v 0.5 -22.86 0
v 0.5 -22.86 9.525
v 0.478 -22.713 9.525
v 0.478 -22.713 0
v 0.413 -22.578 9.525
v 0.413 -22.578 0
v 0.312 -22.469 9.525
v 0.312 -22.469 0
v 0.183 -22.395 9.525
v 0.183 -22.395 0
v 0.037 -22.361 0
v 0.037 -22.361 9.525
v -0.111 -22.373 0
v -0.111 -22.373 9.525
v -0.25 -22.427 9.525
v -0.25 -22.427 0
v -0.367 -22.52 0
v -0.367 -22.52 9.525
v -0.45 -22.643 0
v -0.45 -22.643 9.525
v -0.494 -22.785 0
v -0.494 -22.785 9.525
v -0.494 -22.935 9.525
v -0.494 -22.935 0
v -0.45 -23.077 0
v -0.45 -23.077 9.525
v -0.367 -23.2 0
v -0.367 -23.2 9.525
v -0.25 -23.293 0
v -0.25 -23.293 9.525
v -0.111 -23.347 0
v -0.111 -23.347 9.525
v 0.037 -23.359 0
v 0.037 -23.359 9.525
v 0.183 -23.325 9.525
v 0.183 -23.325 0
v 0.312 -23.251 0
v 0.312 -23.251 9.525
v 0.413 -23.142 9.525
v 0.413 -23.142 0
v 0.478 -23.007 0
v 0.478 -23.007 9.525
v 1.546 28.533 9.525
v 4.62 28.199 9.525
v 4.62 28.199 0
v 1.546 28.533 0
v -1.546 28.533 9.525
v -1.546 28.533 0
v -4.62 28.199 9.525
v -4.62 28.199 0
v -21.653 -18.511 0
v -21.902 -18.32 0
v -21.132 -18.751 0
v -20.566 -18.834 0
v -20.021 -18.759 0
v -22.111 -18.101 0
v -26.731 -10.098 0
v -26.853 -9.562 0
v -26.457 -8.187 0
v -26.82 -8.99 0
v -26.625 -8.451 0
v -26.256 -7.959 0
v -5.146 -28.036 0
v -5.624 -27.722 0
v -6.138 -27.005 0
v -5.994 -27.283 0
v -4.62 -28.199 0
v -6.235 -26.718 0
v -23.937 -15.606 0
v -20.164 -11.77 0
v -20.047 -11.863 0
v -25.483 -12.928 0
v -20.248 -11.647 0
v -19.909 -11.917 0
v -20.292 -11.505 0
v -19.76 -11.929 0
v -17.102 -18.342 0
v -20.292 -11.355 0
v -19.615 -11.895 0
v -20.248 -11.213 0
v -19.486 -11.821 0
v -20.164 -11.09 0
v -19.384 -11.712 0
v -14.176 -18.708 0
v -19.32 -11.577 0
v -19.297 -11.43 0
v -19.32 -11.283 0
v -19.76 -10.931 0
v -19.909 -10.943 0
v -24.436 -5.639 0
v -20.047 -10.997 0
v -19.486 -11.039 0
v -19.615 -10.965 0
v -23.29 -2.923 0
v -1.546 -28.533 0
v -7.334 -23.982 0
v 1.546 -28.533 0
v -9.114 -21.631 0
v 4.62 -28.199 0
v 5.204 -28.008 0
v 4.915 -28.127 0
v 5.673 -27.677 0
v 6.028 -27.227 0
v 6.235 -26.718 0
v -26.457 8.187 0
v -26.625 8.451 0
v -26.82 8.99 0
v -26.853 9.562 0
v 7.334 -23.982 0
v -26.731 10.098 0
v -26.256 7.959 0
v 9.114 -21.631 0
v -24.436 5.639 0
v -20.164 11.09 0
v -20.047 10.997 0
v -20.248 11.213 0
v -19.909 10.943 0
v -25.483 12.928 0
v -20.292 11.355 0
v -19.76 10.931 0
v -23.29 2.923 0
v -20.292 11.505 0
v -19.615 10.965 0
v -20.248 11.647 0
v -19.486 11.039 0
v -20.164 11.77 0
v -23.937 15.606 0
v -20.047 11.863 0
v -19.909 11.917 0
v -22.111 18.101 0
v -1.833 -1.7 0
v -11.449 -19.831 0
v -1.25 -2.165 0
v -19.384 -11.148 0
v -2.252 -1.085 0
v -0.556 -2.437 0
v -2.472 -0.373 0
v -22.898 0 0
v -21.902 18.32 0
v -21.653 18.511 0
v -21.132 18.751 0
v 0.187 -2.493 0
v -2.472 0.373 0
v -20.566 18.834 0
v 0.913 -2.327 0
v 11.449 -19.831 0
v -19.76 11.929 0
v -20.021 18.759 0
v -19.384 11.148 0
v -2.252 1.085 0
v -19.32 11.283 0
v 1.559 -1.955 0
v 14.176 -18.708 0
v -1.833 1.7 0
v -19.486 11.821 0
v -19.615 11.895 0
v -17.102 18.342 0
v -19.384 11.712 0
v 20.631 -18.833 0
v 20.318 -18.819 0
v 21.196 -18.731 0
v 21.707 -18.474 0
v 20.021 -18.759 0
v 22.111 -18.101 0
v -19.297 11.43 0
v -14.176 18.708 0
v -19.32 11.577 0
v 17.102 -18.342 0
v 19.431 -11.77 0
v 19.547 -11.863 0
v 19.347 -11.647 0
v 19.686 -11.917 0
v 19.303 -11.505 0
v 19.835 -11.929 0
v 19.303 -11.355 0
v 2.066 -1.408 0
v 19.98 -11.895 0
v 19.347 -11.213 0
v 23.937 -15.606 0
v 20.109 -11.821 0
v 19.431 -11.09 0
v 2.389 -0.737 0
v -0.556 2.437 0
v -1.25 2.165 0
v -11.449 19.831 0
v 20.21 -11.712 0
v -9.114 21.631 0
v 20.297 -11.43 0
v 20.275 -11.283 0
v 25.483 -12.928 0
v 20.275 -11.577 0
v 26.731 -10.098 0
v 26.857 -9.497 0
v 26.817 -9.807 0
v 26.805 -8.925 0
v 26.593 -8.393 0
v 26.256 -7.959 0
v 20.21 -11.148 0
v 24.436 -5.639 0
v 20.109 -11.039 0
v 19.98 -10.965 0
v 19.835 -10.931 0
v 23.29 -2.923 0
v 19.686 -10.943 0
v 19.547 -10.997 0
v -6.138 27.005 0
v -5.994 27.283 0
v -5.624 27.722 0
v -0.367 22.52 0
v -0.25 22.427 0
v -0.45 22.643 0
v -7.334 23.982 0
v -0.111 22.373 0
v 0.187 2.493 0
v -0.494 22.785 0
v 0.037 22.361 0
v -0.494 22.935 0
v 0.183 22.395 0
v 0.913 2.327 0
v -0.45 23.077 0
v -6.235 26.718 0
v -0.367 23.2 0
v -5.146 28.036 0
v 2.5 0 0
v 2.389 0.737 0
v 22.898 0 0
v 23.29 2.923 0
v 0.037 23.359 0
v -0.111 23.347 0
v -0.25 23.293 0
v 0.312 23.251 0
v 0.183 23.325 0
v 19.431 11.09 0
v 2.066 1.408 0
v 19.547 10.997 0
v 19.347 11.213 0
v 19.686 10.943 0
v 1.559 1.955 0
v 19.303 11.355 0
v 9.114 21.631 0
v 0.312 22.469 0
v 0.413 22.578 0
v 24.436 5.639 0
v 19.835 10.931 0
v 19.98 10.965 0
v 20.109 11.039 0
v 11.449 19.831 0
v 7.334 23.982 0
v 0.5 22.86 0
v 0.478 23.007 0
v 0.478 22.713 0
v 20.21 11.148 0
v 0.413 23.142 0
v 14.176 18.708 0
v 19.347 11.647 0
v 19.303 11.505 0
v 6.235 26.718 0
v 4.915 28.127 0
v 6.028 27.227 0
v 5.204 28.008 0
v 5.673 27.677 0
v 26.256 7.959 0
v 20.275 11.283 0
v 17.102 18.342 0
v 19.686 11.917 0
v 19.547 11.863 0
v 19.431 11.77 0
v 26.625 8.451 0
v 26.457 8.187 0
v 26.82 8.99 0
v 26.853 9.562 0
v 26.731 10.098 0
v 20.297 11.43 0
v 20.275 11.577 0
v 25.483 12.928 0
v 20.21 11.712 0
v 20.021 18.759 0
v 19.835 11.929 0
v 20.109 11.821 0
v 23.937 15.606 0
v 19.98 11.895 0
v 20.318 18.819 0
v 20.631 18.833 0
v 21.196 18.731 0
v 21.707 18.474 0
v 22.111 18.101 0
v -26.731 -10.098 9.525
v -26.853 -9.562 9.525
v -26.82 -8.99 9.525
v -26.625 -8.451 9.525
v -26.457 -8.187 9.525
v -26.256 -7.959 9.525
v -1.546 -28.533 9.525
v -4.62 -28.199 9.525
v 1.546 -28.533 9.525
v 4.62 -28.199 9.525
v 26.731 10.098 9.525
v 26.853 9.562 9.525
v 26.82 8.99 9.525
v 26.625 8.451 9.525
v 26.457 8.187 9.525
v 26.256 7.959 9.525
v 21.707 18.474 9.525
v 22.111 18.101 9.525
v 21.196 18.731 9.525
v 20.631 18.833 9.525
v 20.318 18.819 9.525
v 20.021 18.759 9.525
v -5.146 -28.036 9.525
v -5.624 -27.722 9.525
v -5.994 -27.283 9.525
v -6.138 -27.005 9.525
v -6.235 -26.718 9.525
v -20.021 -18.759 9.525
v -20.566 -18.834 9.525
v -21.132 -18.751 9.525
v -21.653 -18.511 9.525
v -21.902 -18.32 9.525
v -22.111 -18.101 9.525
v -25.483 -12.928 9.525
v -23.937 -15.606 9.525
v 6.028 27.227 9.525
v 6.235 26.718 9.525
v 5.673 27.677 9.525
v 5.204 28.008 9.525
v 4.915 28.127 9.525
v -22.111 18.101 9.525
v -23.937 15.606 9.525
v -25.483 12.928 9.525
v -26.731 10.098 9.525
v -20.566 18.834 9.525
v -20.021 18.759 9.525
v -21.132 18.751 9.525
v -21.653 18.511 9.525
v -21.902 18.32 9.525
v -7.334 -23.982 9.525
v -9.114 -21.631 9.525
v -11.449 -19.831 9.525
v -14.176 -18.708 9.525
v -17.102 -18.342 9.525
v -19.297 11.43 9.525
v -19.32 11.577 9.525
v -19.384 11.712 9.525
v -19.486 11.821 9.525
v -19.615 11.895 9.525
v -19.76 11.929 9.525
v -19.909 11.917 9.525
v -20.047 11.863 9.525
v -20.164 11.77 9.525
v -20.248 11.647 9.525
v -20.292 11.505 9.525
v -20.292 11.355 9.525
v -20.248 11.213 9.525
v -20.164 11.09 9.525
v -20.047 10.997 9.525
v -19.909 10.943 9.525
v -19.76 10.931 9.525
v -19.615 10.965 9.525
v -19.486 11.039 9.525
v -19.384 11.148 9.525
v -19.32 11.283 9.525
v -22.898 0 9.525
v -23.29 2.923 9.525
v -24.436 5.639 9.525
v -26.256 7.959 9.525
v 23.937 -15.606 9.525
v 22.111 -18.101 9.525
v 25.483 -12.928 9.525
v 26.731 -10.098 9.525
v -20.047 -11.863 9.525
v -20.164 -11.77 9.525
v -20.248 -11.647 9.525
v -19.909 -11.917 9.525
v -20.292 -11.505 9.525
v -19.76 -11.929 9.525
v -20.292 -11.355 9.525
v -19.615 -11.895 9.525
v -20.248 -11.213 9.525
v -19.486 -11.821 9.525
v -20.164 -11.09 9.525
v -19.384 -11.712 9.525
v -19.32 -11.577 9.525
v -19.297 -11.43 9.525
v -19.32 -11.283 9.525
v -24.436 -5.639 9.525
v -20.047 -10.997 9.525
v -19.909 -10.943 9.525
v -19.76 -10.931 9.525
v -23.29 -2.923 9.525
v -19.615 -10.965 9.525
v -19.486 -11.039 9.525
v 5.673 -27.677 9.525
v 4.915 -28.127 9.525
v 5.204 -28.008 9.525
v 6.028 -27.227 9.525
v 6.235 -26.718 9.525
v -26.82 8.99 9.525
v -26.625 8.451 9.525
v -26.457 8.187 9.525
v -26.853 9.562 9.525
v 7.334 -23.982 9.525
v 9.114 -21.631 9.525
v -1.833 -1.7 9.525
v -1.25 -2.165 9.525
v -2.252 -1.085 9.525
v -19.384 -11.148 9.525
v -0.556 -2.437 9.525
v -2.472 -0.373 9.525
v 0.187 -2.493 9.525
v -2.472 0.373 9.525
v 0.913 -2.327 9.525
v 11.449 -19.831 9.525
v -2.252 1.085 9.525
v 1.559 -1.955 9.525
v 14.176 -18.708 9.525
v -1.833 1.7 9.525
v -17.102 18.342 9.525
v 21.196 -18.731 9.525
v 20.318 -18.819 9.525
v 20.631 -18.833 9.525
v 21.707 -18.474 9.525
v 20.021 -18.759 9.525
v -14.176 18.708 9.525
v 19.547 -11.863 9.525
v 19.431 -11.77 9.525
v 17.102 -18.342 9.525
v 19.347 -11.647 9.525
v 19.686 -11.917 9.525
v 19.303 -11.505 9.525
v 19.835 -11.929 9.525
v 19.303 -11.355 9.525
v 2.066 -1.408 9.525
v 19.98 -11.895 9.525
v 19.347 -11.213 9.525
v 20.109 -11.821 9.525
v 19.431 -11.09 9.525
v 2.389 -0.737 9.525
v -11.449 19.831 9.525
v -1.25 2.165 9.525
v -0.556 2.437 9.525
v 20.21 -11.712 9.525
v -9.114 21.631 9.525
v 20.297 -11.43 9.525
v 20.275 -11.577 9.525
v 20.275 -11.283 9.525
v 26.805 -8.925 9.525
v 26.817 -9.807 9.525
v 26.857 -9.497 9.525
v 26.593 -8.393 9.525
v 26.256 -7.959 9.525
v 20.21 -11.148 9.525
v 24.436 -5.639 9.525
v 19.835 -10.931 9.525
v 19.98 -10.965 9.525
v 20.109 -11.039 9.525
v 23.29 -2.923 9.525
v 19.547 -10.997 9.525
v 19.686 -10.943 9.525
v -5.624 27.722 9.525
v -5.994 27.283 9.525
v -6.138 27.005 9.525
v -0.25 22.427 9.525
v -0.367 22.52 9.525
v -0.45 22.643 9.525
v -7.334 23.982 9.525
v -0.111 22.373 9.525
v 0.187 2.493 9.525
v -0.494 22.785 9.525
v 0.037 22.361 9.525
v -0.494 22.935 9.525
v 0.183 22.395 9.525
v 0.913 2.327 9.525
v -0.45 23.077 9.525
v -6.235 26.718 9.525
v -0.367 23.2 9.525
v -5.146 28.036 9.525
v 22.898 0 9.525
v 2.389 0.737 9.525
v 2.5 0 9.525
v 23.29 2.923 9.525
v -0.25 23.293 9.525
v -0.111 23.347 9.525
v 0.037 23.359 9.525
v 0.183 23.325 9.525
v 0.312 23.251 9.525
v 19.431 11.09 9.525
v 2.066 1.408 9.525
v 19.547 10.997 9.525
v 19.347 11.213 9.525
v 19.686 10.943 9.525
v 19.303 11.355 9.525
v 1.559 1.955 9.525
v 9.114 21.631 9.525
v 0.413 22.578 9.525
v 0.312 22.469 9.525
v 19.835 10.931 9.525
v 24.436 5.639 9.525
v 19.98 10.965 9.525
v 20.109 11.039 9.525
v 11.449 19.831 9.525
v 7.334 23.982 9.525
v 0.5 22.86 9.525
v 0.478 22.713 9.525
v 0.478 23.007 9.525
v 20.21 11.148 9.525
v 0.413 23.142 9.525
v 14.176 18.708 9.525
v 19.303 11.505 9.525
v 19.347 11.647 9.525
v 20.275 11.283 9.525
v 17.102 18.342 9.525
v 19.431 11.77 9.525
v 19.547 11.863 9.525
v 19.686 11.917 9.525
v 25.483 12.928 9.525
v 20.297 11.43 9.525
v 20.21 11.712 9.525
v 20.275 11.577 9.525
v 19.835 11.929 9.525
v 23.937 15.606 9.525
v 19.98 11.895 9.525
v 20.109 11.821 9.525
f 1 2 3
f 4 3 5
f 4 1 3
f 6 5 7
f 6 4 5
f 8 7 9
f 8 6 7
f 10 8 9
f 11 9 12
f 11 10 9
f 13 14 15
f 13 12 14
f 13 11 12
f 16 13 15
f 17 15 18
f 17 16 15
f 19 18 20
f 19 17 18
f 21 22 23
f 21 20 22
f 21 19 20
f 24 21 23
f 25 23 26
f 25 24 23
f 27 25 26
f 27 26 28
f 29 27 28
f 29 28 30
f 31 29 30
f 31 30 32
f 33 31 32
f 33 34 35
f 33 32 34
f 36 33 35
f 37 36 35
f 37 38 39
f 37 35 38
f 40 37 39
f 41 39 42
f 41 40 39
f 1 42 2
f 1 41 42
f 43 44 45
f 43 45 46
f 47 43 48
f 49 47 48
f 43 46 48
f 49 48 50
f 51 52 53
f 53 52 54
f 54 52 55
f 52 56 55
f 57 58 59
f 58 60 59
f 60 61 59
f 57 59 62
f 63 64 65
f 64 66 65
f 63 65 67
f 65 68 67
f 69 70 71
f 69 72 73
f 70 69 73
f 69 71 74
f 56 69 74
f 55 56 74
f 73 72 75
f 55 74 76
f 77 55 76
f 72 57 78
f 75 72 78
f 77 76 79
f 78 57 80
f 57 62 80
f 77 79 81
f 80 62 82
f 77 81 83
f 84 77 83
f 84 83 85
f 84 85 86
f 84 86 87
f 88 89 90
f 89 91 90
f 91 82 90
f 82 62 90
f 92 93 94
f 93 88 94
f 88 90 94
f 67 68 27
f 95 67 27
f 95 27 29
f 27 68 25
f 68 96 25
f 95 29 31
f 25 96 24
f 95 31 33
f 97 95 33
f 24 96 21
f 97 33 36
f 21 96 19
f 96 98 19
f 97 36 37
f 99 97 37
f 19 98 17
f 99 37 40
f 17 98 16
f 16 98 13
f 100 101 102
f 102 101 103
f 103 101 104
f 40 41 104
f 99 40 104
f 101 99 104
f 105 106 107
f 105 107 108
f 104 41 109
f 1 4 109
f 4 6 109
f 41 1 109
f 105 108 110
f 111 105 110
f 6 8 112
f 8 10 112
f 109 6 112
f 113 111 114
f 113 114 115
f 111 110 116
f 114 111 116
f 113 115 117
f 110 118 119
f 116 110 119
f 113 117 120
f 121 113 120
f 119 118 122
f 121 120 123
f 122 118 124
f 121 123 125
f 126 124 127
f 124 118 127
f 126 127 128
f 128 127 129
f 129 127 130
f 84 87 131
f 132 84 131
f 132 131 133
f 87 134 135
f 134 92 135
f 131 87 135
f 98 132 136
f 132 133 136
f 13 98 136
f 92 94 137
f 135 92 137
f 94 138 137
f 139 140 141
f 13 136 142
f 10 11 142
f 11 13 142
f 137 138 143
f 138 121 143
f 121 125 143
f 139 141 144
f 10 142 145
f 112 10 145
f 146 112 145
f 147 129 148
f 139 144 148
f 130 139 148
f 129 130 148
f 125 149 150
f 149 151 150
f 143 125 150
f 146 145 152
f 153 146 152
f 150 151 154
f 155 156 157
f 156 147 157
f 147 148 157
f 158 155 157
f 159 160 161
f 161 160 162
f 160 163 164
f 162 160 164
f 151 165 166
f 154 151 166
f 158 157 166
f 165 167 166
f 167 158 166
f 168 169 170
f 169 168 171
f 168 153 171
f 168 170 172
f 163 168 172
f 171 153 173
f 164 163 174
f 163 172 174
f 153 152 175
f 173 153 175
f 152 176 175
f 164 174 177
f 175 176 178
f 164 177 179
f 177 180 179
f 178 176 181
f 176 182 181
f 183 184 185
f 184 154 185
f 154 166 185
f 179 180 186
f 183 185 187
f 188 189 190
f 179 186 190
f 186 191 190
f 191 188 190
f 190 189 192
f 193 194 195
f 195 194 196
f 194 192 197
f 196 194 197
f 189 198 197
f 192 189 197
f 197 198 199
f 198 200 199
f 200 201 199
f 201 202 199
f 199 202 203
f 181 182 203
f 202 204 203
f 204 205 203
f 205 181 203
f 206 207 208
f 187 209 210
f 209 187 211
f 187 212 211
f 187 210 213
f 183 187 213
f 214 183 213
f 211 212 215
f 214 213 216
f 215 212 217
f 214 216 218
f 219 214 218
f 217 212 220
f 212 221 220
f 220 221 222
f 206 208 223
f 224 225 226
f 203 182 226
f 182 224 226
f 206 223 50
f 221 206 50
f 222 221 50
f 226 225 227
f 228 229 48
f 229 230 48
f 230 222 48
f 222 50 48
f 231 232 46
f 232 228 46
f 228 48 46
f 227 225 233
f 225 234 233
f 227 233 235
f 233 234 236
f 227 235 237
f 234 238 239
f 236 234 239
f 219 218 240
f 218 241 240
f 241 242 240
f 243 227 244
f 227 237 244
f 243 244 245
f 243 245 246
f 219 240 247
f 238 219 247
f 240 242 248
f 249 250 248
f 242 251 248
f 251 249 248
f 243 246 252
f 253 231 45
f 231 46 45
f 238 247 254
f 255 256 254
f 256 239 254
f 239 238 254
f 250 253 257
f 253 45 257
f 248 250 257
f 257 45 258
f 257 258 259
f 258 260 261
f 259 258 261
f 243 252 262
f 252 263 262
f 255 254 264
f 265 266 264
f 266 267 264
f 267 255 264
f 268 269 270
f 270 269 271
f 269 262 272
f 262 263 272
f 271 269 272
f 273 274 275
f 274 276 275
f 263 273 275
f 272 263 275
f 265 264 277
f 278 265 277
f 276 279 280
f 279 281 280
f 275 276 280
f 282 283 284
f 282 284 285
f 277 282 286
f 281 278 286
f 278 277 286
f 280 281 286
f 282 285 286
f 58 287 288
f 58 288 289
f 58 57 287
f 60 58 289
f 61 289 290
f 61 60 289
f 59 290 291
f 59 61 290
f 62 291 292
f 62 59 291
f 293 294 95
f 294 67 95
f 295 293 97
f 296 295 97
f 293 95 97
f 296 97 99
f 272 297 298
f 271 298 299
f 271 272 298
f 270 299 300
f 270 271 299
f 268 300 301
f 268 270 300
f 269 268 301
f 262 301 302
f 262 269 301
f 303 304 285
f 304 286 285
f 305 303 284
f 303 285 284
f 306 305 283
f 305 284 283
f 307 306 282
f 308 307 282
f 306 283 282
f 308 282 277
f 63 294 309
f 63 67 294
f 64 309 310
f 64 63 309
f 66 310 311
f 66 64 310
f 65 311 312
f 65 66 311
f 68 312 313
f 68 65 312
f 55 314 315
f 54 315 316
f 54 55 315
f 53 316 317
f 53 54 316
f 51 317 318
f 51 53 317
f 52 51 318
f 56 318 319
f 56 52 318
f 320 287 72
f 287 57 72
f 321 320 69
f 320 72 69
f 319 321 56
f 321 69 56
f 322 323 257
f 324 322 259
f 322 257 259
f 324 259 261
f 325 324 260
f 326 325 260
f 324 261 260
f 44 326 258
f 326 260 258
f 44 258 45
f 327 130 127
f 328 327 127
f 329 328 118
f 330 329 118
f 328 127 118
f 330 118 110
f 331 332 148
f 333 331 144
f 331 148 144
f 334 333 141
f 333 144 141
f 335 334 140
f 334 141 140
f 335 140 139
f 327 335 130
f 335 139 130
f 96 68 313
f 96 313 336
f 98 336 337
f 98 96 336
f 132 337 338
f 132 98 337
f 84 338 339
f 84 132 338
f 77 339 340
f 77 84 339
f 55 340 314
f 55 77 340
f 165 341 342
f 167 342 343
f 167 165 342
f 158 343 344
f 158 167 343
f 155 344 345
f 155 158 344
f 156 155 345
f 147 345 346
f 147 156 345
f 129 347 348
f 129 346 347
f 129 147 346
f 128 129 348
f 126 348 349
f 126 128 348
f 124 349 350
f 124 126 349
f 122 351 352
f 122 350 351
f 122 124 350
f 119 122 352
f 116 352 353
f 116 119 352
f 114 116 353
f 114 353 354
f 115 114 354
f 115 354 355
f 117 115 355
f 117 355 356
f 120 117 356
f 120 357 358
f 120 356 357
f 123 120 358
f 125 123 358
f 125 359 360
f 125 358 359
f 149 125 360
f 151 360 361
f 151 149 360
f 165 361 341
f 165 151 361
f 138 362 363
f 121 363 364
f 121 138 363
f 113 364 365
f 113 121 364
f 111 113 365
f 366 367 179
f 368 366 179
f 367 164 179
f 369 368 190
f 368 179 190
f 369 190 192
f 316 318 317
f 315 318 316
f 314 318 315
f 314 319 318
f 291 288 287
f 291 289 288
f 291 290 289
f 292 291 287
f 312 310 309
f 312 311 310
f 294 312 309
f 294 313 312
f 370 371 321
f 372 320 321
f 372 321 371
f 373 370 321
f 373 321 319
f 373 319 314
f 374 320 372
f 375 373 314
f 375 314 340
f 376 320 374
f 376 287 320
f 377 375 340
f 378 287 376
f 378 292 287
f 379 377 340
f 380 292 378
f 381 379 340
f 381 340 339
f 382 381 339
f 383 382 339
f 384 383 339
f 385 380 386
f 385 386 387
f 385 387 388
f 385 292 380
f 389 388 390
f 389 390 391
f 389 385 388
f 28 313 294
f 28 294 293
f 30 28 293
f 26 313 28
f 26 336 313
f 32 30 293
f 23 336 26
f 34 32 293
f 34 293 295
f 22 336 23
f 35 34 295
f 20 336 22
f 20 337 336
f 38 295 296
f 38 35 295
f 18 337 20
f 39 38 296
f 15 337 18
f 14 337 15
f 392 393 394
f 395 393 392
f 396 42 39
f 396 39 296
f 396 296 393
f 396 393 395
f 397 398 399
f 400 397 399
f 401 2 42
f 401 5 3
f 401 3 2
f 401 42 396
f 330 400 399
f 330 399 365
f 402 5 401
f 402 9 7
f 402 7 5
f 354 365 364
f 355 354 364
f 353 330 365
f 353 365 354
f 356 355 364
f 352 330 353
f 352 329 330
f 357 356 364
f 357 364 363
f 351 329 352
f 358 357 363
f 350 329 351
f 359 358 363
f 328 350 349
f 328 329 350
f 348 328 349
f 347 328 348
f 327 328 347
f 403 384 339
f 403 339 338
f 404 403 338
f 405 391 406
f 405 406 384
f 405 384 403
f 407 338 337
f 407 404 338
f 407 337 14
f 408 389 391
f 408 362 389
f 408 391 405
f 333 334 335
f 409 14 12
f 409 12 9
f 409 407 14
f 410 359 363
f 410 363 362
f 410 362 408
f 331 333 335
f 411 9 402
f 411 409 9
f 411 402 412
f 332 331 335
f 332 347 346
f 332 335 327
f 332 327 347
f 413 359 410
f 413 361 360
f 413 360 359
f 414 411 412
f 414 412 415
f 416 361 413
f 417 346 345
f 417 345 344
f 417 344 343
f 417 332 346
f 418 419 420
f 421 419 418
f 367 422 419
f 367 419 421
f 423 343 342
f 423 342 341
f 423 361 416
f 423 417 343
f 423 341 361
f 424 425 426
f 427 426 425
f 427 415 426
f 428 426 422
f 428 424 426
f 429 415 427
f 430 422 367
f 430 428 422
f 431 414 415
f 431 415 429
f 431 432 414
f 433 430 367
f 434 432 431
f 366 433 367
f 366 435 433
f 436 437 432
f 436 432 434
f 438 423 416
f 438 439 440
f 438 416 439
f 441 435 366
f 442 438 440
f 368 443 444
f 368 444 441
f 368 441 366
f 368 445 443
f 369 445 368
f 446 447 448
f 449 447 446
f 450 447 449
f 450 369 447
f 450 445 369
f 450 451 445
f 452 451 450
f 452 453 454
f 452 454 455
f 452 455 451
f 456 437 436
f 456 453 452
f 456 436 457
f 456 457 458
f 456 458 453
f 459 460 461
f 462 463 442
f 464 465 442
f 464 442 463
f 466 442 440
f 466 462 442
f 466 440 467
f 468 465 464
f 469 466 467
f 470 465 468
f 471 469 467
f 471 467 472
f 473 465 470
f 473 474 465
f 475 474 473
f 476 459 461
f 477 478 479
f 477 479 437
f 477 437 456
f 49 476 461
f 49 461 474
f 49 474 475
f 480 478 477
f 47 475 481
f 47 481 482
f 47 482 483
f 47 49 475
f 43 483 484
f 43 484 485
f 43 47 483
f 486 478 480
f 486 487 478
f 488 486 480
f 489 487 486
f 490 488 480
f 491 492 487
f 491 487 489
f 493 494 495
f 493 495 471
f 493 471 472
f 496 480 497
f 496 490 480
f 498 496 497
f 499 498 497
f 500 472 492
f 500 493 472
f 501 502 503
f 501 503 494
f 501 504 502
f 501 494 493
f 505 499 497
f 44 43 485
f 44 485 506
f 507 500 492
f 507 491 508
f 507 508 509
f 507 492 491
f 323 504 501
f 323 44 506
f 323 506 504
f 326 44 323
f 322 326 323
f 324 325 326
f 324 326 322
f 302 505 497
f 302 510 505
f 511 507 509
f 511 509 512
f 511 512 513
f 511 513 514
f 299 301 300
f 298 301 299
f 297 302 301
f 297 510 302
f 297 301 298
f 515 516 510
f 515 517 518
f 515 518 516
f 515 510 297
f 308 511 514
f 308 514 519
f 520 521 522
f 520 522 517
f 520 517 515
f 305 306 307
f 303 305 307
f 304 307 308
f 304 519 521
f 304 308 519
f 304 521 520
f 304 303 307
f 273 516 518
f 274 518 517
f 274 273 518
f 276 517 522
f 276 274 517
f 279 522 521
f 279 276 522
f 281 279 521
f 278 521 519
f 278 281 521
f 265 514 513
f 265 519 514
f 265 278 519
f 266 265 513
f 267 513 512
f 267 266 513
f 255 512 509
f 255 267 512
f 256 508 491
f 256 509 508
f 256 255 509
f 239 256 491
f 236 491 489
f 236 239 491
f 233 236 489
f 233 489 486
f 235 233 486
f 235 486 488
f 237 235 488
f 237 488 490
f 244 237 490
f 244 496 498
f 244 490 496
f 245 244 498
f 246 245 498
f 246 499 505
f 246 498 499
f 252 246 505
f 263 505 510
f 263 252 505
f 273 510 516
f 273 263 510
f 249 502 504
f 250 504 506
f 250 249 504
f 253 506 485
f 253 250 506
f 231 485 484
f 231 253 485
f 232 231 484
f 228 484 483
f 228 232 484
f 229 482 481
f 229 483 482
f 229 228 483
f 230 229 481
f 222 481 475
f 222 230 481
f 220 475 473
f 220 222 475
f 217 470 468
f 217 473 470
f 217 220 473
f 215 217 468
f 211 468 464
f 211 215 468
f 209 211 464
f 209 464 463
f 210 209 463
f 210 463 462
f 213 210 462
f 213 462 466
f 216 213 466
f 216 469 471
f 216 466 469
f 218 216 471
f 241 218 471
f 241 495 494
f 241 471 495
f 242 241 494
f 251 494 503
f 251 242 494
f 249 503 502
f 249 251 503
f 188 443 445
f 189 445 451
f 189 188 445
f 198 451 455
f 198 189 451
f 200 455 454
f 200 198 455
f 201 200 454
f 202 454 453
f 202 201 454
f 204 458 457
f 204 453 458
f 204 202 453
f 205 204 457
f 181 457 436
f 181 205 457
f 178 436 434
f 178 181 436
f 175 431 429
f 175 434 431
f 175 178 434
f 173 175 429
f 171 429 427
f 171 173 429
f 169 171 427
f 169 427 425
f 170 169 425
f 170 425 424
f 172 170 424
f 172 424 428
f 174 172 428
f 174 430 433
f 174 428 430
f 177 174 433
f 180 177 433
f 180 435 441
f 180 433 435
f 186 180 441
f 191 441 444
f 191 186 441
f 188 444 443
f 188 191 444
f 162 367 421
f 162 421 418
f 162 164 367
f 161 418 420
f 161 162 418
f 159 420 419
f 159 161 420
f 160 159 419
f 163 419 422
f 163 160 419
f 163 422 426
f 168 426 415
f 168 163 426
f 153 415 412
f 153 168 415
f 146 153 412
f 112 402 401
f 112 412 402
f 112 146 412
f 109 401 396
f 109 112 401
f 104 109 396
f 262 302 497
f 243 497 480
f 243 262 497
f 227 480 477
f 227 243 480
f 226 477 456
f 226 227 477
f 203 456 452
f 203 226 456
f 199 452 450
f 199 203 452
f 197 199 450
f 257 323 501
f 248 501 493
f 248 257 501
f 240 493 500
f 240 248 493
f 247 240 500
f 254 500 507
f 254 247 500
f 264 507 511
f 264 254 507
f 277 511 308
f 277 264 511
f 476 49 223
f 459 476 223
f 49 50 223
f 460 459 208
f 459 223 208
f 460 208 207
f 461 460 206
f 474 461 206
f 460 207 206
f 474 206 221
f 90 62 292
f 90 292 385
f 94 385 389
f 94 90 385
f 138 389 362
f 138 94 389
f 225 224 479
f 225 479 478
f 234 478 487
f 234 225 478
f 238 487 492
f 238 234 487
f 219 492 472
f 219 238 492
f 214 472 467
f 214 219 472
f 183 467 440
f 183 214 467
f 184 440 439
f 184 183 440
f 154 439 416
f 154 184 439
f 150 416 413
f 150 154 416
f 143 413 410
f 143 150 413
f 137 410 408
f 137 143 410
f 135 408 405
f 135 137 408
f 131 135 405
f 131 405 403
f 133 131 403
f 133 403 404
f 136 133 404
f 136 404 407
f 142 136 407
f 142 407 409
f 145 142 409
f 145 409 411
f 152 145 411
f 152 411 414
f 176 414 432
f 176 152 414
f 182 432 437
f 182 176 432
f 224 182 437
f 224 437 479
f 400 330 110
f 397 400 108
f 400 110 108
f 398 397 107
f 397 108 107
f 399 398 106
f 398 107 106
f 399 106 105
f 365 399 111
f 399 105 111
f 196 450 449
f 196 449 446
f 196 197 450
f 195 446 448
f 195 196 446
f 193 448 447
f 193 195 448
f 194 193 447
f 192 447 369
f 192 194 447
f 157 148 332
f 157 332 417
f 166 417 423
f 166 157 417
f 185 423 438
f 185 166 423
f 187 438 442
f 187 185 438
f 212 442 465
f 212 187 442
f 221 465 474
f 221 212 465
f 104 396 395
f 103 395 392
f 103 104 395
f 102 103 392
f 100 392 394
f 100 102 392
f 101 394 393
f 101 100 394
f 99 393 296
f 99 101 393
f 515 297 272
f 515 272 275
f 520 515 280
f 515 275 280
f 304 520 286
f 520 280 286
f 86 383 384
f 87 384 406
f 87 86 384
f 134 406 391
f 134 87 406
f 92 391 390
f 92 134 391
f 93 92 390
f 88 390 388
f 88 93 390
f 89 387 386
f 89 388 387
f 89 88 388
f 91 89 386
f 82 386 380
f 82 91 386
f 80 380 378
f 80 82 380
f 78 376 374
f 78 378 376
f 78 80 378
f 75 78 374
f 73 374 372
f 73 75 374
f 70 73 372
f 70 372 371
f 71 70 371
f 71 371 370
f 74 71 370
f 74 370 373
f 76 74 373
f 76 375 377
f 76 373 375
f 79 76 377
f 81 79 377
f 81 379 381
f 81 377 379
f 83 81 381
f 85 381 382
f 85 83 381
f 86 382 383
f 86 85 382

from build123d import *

# Parameters (mm, degrees)
F0_R     = 28.575
F0_R_2   = 2.5
F1_DEPTH = 9.525
F3_DEPTH = 25.4
F4_R     = 0.5
F5_DEPTH = 25.4
F6_R     = 2


with BuildPart() as f1:
    # F0 (on Top) → F1 (new body)
    with BuildSketch(Plane.XY):
        Circle(F0_R)
        Circle(F0_R_2, mode=Mode.SUBTRACT)
    extrude(amount=F1_DEPTH)

    # F2 (on Top) → F3 (cut)
    with BuildSketch(Plane.XY):
        with BuildLine():
            ThreePointArc((6.6033751745, -33.3637991738), (17.0054966041, -29.4543841262), (25.592210064, -22.4005902387))
            ThreePointArc((25.592210064, -22.4005902387), (11.4492466041, -19.8306768266), (6.6033751745, -33.3637991738))
        make_face()
        with BuildLine():
            ThreePointArc((-25.592210064, -22.4005902387), (-17.0054966041, -29.4543841262), (-6.6033751745, -33.3637991738))
            ThreePointArc((-6.6033751745, -33.3637991738), (-6.0720335059, -31.4411002438), (-5.8929966041, -29.4543841262))
            ThreePointArc((-5.8929966041, -29.4543841262), (-13.259311683, -18.9923692731), (-25.592210064, -22.4005902387))
        make_face()
        with BuildLine():
            ThreePointArc((-22.8984932081, 0), (-25.5356944726, 7.187278177), (-32.1955852385, 10.9632089351))
            ThreePointArc((-32.1955852385, 10.9632089351), (-34.0109932081, 0), (-32.1955852385, -10.9632089351))
            ThreePointArc((-32.1955852385, -10.9632089351), (-25.5356944726, -7.187278177), (-22.8984932081, 0))
        make_face()
        with BuildLine():
            ThreePointArc((-5.8929966041, 29.4543841262), (-6.0720335059, 31.4411002438), (-6.6033751745, 33.3637991738))
            ThreePointArc((-6.6033751745, 33.3637991738), (-17.0054966041, 29.4543841262), (-25.592210064, 22.4005902387))
            ThreePointArc((-25.592210064, 22.4005902387), (-13.259311683, 18.9923692731), (-5.8929966041, 29.4543841262))
        make_face()
        with BuildLine():
            ThreePointArc((6.6033751745, 33.3637991738), (11.4492466041, 19.8306768266), (25.592210064, 22.4005902387))
            ThreePointArc((25.592210064, 22.4005902387), (17.0054966041, 29.4543841262), (6.6033751745, 33.3637991738))
        make_face()
        with BuildLine():
            ThreePointArc((32.1955852385, -10.9632089351), (33.5540719577, -5.55625), (34.0109932081, 0))
            ThreePointArc((34.0109932081, 0), (33.5540719577, 5.55625), (32.1955852385, 10.9632089351))
            ThreePointArc((32.1955852385, 10.9632089351), (22.8984932081, 0), (32.1955852385, -10.9632089351))
        make_face()
    extrude(amount=F3_DEPTH, mode=Mode.SUBTRACT)

    # F4 (on Top) → F5 (cut)
    with BuildSketch(Plane.XY):
        with Locations((0, 22.86)):
            Circle(F4_R)
        with Locations((-19.7973407305, 11.43)):
            Circle(F4_R)
        with Locations((-19.7973407305, -11.43)):
            Circle(F4_R)
        with Locations((0, -22.86)):
            Circle(F4_R)
        with Locations((19.7973407305, -11.43)):
            Circle(F4_R)
        with Locations((19.7973407305, 11.43)):
            Circle(F4_R)
    extrude(amount=F5_DEPTH, mode=Mode.SUBTRACT)

    # F6
    f6_edges = [f1.edges().sort_by_distance(p)[0] for p in [
        (-21.197157, 19.162755, 4.7625),
        (-5.996854, 27.938654, 4.7625),
        (21.197157, 19.162755, 4.7625),
        (5.996854, 27.938654, 4.7625),
        (-27.194011, -8.775899, 4.7625),
        (-27.194011, 8.775899, 4.7625),
        (-5.996854, -27.938654, 4.7625),
        (-21.197157, -19.162755, 4.7625),
        (21.197157, -19.162755, 4.7625),
        (5.996854, -27.938654, 4.7625),
        (27.194011, 8.775899, 4.7625),
        (27.194011, -8.775899, 4.7625),
    ]]
    fillet(f6_edges, radius=F6_R)


solid = f1.part
